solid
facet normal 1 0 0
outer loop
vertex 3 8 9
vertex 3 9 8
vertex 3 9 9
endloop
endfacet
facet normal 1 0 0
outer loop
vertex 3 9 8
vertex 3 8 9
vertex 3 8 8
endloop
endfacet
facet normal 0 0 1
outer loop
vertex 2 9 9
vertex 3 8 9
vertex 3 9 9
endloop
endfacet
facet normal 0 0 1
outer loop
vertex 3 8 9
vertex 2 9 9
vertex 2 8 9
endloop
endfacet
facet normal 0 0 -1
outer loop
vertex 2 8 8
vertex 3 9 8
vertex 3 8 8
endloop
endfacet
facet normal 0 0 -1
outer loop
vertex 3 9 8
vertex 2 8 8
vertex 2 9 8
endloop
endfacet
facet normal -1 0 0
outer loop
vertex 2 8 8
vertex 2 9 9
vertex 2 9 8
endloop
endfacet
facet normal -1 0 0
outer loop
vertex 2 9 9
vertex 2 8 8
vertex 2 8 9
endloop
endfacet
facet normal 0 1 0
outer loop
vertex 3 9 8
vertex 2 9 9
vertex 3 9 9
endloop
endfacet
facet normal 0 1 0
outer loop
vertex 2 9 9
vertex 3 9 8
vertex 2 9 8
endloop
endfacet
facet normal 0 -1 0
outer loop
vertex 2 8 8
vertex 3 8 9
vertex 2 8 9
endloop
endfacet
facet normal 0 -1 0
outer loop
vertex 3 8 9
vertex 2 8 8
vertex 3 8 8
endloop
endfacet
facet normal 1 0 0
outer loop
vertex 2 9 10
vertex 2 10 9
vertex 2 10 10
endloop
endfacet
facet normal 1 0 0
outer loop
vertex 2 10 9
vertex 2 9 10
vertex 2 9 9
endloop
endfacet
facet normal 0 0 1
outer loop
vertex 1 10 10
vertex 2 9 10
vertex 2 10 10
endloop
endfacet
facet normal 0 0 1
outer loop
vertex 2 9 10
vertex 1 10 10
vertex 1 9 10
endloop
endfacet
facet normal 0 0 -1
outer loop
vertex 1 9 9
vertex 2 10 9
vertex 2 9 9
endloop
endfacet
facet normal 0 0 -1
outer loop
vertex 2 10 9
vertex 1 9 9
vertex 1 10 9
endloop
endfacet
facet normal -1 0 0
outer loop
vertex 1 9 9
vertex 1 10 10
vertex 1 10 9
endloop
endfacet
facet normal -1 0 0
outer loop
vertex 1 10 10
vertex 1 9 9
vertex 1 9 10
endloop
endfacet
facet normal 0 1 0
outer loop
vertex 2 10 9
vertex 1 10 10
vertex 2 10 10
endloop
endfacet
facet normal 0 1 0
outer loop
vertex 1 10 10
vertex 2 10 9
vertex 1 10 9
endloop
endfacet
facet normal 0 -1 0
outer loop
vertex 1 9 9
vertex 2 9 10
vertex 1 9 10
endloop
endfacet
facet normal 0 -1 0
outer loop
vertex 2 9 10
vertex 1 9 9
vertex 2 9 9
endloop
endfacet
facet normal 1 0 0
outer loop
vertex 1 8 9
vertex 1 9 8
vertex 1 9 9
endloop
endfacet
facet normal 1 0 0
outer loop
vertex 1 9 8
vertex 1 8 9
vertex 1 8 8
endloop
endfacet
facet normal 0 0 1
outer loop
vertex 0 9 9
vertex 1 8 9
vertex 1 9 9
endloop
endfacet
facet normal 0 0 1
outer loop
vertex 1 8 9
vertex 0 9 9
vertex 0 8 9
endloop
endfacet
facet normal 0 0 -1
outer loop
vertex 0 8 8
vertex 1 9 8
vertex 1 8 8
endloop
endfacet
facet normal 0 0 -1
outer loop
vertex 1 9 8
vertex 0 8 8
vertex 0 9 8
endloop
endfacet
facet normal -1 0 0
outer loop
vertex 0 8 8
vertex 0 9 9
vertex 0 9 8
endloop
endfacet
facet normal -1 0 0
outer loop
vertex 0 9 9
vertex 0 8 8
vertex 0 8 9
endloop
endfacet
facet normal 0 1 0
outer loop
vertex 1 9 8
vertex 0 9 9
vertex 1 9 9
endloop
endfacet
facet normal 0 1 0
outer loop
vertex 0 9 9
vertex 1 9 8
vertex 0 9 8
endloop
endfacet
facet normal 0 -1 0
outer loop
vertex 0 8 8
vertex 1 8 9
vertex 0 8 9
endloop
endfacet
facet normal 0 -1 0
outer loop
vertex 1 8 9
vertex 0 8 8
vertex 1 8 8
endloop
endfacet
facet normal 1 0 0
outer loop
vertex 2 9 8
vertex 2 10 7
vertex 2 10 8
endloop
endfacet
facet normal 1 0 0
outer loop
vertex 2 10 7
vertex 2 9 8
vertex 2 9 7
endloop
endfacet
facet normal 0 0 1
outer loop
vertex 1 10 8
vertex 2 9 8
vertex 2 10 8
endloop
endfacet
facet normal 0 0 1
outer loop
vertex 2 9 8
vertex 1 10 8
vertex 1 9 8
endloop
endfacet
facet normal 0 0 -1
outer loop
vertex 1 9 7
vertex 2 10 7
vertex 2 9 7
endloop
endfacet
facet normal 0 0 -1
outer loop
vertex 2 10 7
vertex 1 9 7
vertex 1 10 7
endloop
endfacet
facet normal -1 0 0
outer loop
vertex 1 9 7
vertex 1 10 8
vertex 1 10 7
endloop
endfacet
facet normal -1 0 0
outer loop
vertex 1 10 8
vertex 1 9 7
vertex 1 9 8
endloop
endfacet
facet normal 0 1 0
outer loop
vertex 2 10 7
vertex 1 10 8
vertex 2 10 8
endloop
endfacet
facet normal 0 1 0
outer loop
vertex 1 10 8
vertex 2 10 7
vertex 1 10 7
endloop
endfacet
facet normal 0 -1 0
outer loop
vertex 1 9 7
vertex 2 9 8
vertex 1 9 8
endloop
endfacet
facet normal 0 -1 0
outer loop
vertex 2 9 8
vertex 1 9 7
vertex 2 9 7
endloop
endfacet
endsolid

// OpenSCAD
module space ()
{
  translate([2, 8, 8]) { cube(1); }
  translate([1, 9, 9]) { cube(1); }
  translate([0, 8, 8]) { cube(1); }
  translate([1, 9, 7]) { cube(1); }
}

space();
